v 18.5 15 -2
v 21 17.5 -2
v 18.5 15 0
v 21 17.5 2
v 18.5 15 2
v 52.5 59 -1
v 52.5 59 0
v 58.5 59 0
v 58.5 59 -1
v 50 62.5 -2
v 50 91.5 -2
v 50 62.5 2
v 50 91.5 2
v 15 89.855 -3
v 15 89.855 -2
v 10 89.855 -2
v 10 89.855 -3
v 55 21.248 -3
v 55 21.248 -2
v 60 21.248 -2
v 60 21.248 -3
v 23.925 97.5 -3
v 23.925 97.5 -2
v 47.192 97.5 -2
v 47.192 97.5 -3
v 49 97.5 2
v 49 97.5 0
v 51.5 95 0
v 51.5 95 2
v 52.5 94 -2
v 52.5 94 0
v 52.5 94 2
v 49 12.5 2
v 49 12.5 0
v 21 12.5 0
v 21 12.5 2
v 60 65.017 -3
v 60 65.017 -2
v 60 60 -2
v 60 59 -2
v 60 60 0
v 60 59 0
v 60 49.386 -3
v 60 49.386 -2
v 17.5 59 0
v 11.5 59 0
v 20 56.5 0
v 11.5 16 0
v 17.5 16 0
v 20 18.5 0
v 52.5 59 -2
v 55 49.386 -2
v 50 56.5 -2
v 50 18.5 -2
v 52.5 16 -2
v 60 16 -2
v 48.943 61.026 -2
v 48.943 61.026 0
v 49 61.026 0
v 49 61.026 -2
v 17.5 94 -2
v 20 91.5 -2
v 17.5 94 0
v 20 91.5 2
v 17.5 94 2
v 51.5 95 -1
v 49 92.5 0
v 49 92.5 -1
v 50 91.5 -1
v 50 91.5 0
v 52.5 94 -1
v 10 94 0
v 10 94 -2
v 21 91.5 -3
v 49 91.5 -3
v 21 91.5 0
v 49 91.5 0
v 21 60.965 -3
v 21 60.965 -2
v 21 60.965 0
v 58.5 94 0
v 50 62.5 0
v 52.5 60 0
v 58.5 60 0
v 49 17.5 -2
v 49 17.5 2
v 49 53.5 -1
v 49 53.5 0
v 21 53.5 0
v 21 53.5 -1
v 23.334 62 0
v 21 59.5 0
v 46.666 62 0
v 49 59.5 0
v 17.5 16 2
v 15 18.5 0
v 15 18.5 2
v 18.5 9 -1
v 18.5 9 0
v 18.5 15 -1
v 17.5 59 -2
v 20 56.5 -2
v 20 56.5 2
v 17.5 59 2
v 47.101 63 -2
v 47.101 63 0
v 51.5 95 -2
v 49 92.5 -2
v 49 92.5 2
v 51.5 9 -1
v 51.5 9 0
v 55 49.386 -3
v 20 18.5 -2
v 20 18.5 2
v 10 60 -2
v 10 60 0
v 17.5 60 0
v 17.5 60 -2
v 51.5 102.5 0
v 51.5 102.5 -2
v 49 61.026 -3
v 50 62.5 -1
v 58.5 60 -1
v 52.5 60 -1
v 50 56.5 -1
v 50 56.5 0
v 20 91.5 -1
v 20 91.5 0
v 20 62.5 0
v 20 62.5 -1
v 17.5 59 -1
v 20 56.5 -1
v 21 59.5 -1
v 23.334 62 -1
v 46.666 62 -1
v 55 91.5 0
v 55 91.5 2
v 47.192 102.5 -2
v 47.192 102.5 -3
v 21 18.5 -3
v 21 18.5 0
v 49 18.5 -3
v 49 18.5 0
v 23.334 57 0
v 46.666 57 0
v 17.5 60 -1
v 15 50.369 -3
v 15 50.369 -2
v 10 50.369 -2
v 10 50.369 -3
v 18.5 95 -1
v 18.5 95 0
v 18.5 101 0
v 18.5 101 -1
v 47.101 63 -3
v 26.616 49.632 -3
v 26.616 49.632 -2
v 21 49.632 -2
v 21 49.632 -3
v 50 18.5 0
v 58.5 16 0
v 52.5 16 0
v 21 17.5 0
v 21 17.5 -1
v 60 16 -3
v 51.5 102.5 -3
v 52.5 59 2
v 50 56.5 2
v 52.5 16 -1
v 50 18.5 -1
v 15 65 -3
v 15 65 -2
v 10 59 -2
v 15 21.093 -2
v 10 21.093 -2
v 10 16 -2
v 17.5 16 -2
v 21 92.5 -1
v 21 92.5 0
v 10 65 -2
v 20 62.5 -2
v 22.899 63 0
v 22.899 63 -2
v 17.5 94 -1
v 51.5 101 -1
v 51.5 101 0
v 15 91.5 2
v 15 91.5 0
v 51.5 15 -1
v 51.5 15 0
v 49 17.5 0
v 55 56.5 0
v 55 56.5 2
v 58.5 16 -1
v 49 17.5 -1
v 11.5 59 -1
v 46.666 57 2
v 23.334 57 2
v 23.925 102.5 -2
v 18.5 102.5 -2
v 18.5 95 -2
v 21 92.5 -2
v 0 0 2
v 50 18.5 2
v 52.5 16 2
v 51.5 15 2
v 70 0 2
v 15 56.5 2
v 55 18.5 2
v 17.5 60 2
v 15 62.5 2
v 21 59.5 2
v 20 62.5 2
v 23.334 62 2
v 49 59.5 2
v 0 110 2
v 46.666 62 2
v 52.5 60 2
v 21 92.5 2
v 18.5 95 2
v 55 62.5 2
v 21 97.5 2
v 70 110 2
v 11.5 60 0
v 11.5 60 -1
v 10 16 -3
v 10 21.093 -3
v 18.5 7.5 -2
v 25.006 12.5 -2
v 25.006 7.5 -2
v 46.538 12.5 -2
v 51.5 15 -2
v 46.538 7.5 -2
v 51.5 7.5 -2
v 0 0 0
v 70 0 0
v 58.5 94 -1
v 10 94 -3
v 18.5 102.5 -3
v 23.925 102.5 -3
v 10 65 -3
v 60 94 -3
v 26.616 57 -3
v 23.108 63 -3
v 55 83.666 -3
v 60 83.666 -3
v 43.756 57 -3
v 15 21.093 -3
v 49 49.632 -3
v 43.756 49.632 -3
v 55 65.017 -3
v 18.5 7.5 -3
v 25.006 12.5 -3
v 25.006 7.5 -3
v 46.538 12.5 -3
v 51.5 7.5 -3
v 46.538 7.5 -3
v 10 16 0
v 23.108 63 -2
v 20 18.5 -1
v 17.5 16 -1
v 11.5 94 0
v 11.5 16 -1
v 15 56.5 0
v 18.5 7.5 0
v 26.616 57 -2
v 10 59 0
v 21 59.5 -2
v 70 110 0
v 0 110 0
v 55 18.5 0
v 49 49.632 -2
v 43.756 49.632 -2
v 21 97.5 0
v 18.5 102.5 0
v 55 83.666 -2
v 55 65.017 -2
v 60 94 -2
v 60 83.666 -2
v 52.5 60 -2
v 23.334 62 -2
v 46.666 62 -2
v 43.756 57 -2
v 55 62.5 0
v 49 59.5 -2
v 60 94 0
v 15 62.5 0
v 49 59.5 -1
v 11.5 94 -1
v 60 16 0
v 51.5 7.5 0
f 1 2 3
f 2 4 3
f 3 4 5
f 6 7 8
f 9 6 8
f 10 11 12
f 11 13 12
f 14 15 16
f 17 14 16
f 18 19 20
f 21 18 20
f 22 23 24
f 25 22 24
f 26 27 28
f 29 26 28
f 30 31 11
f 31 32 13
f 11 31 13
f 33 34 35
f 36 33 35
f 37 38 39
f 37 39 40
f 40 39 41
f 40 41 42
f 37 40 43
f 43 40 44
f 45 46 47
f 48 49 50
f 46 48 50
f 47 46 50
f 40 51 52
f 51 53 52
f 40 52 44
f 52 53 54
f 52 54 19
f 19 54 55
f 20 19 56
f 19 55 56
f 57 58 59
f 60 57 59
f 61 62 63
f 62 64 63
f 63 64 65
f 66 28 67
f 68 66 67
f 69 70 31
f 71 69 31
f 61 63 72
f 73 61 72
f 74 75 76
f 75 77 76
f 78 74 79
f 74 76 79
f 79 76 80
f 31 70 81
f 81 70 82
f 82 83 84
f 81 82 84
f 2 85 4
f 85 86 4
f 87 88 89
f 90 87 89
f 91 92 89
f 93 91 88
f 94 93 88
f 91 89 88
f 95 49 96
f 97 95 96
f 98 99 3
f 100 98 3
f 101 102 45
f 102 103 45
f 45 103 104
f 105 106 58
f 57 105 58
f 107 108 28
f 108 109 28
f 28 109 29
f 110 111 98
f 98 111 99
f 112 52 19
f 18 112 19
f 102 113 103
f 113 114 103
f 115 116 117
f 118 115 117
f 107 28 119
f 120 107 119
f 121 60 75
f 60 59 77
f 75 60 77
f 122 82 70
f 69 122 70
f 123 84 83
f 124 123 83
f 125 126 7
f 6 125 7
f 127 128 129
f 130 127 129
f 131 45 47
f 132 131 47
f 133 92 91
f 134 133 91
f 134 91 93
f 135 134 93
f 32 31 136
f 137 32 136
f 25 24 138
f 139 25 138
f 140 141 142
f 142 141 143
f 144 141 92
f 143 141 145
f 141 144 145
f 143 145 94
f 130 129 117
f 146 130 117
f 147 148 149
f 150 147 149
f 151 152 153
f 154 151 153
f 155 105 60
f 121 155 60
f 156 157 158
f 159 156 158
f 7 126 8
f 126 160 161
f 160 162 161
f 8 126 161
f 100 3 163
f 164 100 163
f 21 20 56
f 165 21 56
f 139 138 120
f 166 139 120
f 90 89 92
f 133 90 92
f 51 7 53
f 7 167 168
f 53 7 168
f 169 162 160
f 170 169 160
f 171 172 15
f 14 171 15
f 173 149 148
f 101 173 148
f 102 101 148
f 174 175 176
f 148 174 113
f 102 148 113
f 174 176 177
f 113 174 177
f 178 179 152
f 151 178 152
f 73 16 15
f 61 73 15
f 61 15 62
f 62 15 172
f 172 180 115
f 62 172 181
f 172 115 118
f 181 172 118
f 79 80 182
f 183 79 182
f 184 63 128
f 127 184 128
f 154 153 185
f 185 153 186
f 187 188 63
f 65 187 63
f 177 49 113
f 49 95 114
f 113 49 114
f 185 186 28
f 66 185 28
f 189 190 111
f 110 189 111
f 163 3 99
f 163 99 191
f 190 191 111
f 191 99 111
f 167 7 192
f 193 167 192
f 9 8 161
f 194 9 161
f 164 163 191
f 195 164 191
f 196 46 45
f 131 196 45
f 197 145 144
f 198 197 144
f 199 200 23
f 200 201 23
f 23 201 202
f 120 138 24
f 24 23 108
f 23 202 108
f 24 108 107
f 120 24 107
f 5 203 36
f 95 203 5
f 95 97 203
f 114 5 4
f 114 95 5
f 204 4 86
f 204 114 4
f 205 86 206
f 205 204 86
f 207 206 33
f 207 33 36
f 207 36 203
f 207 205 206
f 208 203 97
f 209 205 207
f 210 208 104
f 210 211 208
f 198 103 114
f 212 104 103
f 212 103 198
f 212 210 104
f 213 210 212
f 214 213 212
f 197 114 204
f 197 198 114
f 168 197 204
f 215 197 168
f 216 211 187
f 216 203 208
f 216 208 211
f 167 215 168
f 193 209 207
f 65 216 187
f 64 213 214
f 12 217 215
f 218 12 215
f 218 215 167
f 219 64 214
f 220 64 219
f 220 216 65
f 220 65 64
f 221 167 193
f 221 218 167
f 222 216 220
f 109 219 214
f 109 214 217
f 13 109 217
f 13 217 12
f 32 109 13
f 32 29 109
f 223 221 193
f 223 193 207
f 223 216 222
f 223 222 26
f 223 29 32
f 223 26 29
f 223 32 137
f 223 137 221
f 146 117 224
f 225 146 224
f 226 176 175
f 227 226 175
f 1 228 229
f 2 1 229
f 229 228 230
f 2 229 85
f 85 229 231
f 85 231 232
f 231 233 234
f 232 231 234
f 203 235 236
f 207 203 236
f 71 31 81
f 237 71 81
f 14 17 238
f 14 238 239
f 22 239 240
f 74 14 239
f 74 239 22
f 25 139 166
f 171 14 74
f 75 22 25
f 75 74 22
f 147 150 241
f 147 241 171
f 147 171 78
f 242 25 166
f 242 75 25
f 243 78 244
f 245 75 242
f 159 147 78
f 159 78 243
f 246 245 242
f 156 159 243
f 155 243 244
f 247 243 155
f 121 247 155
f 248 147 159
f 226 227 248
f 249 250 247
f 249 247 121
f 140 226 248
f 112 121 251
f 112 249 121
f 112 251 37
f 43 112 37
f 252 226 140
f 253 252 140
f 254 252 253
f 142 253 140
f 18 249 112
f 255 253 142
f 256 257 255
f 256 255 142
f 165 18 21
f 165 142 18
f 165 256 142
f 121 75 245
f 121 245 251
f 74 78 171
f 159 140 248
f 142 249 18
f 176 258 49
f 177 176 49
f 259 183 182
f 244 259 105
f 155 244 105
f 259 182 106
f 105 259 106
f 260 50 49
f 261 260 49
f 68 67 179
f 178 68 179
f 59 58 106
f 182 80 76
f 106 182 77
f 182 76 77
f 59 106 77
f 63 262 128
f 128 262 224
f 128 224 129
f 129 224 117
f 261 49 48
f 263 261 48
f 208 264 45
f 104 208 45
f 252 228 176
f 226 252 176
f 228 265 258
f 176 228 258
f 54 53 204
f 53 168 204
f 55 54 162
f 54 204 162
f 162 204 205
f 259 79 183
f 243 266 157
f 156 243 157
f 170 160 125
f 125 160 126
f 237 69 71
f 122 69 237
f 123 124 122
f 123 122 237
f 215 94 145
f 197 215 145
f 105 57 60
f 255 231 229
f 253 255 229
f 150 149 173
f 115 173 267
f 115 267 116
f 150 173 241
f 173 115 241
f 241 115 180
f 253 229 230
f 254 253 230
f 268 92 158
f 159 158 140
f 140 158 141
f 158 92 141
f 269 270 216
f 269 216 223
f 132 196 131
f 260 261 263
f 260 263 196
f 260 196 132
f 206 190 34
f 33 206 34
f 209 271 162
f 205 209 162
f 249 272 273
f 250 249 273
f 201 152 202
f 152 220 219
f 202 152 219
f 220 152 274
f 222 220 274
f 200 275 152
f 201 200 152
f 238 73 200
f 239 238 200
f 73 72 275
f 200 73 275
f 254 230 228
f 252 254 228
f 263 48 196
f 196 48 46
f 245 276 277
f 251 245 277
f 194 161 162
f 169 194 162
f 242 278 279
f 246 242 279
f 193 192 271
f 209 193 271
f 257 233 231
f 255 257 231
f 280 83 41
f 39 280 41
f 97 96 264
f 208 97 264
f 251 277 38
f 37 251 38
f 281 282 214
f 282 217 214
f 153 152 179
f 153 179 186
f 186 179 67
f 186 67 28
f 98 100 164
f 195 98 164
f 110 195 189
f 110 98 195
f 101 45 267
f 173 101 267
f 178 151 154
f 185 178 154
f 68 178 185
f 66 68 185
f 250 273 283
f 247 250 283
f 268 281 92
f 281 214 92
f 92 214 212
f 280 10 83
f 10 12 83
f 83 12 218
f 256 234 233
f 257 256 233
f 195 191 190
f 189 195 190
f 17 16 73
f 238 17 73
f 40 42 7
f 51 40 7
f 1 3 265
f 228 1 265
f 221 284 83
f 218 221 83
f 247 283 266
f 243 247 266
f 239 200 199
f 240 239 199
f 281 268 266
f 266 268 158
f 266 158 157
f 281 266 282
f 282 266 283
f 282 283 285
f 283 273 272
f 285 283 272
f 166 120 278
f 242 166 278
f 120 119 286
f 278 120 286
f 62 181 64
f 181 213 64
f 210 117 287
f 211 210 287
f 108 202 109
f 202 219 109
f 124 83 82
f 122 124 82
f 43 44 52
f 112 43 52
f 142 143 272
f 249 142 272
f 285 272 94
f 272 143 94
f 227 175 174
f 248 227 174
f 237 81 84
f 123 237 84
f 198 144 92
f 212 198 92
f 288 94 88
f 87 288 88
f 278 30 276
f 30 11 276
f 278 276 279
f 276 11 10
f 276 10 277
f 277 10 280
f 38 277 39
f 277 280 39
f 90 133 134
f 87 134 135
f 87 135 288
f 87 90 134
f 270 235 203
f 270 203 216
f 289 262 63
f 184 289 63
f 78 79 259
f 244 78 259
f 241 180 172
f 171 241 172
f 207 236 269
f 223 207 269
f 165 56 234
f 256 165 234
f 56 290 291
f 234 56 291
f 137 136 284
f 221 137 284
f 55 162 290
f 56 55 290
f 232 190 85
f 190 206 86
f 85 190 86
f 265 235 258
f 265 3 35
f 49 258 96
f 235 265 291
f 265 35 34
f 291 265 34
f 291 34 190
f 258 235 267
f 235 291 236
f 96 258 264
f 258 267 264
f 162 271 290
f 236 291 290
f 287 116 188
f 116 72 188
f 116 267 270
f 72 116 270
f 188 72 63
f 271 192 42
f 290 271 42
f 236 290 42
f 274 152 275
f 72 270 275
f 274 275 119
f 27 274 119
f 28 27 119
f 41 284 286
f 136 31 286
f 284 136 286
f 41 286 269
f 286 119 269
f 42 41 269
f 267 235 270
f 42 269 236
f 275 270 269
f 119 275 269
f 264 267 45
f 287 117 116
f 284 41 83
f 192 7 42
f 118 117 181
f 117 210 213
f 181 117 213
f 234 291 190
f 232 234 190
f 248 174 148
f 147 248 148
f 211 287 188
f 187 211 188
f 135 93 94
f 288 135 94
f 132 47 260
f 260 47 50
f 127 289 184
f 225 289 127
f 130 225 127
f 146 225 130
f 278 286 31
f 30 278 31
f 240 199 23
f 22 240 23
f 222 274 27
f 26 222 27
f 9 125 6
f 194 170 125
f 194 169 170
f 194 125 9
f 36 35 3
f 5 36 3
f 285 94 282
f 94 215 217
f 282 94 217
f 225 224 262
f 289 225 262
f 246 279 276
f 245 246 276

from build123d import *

# Parameters (mm, degrees)
F0_W     = 70
F0_H     = 110
F1_DEPTH = 2
F3_DEPTH = 2
F5_DEPTH = 1
F7_DEPTH = 1


# Not quite as in the source:
# - a feature names something its author has since deleted; it is built from what else it names


with BuildPart() as f1:
    # F0 (on Top) → F1 (new body)
    with BuildSketch(Plane.XY):
        with Locations((35, 55)):
            Rectangle(F0_W, F0_H)
        Polygon((20, 18.5), (17.5, 16), (15, 18.5), (15, 56.5), (17.5, 59), (20, 56.5), align=None, mode=Mode.SUBTRACT)
        Polygon((18.5, 15), (21, 17.5), (49, 17.5), (51.5, 15), (49, 12.5), (21, 12.5), align=None, mode=Mode.SUBTRACT)
        Polygon((50, 18.5), (50, 56.5), (52.5, 59), (55, 56.5), (55, 18.5), (52.5, 16), align=None, mode=Mode.SUBTRACT)
        Polygon((15, 91.5), (17.5, 94), (20, 91.5), (20, 62.5), (17.5, 60), (15, 62.5), align=None, mode=Mode.SUBTRACT)
        Polygon((23.3336448214, 57), (21, 59.5), (23.3336448214, 62), (46.6663551786, 62), (49, 59.5), (46.6663551786, 57), align=None, mode=Mode.SUBTRACT)
        Polygon((50, 91.5), (52.5, 94), (55, 91.5), (55, 62.5), (52.5, 60), (50, 62.5), align=None, mode=Mode.SUBTRACT)
        Polygon((21, 92.5), (18.5, 95), (21, 97.5), (49, 97.5), (51.5, 95), (49, 92.5), align=None, mode=Mode.SUBTRACT)
    extrude(amount=F1_DEPTH)

    # F2 (on face) → F3 (join)
    with BuildSketch(Plane(origin=(0, 0, 0), x_dir=(1, 0, 0), z_dir=(0, 0, -1))):
        Polygon((51.5, -15), (49, -17.5), (21, -17.5), (18.5, -15), (18.5, -7.5), (10, -16), (17.5, -16), (20, -18.5), (20, -56.5), (17.5, -59), (10, -59), (10, -60), (17.5, -60), (20, -62.5), (20, -91.5), (17.5, -94), (10, -94), (18.5, -102.5), (18.5, -95), (21, -92.5), (49, -92.5), (51.5, -95), (51.5, -102.5), (60, -94), (52.5, -94), (50, -91.5), (50, -62.5), (52.5, -60), (60, -60), (60, -59), (52.5, -59), (50, -56.5), (50, -18.5), (52.5, -16), (60, -16), (51.5, -7.5), align=None)
        Polygon((49, -61.0261154606), (49, -91.5), (21, -91.5), (21, -60.9654872063), (22.8991320981, -63), (47.1008679019, -63), (48.9434060753, -61.0261154606), align=None, mode=Mode.SUBTRACT)
        Polygon((21, -18.5), (49, -18.5), (49, -51.9142135624), (49, -59.5), (46.6663551786, -62), (23.3336448214, -62), (21, -59.5), (21, -51.9142135624), align=None, mode=Mode.SUBTRACT)
    extrude(amount=F3_DEPTH)

    # F4 (on face) → F5 (join)
    with BuildSketch(Plane(origin=(0, 0, -2), x_dir=(1, 0, 0), z_dir=(0, 0, -1))):
        Polygon((23.9248658717, -102.5), (23.9248658717, -97.5), (47.1921387315, -97.5), (47.1921387315, -102.5), (51.5, -102.5), (60, -94), (60, -83.6655944586), (55, -83.6655944586), (55, -65.0172777596), (60, -65.0172777596), (60, -49.3863895535), (55, -49.3863895535), (55, -21.2481319904), (60, -21.2481319904), (60, -16), (51.5, -7.5), (46.5375445783, -7.5), (46.5375445783, -12.5), (25.0055992454, -12.5), (25.0055992454, -7.5), (18.5, -7.5), (10, -16), (10, -21.093017593), (15, -21.093017593), (15, -50.3691881895), (10, -50.3691881895), (10, -65.0000932597), (15, -65.0000932597), (15, -89.8551392555), (10, -89.8551392555), (10, -94), (18.5, -102.5), align=None)
        Polygon((49, -91.5), (44.0906696022, -91.5), (21, -91.5), (21, -68.9583107835), (21, -60.9654872063), (23.1079336207, -63), (47.1008679019, -63), (49, -61.0261154606), align=None, mode=Mode.SUBTRACT)
        Polygon((21, -49.632139504), (21, -18.5), (49, -18.5), (49, -49.632139504), (43.7561757863, -49.632139504), (43.7561757863, -57), (26.6159512103, -57), (26.6159512103, -49.632139504), align=None, mode=Mode.SUBTRACT)
    extrude(amount=F5_DEPTH)


with BuildPart() as f7:
    # F6 (on face) → F7 (new body)
    with BuildSketch(Plane(origin=(0, 0, 0), x_dir=(1, 0, 0), z_dir=(0, 0, -1))):
        Polygon((49, -92.5), (21, -92.5), (18.5, -95), (18.5, -101), (51.5, -101), (51.5, -95), align=None)
    extrude(amount=F7_DEPTH)


with BuildPart() as f7b:
    # F6 (on face) → F7, piece 2 (new body)
    with BuildSketch(Plane(origin=(0, 0, 0), x_dir=(1, 0, 0), z_dir=(0, 0, -1))):
        Polygon((11.5, -94), (17.5, -94), (20, -91.5), (20, -62.5), (17.5, -60), (11.5, -60), align=None)
    extrude(amount=F7_DEPTH)


with BuildPart() as f7c:
    # F6 (on face) → F7, piece 3 (new body)
    with BuildSketch(Plane(origin=(0, 0, 0), x_dir=(1, 0, 0), z_dir=(0, 0, -1))):
        Polygon((50, -91.5), (52.5, -94), (58.5, -94), (58.5, -60), (52.5, -60), (50, -62.5), align=None)
    extrude(amount=F7_DEPTH)


with BuildPart() as f7d:
    # F6 (on face) → F7, piece 4 (new body)
    with BuildSketch(Plane(origin=(0, 0, 0), x_dir=(1, 0, 0), z_dir=(0, 0, -1))):
        Polygon((21, -53.5), (21, -59.5), (23.3336448214, -62), (46.6663551786, -62), (49, -59.5), (49, -53.5), align=None)
    extrude(amount=F7_DEPTH)


with BuildPart() as f7e:
    # F6 (on face) → F7, piece 5 (new body)
    with BuildSketch(Plane(origin=(0, 0, 0), x_dir=(1, 0, 0), z_dir=(0, 0, -1))):
        Polygon((17.5, -59), (20, -56.5), (20, -18.5), (17.5, -16), (11.5, -16), (11.5, -59), align=None)
    extrude(amount=F7_DEPTH)


with BuildPart() as f7f:
    # F6 (on face) → F7, piece 6 (new body)
    with BuildSketch(Plane(origin=(0, 0, 0), x_dir=(1, 0, 0), z_dir=(0, 0, -1))):
        Polygon((50, -18.5), (50, -56.5), (52.5, -59), (58.5, -59), (58.5, -16), (52.5, -16), align=None)
    extrude(amount=F7_DEPTH)


with BuildPart() as f7g:
    # F6 (on face) → F7, piece 7 (new body)
    with BuildSketch(Plane(origin=(0, 0, 0), x_dir=(1, 0, 0), z_dir=(0, 0, -1))):
        Polygon((18.5, -9), (18.5, -15), (21, -17.5), (49, -17.5), (51.5, -15), (51.5, -9), align=None)
    extrude(amount=F7_DEPTH)


solid = Compound([f1.part, f7.part, f7b.part, f7c.part, f7d.part, f7e.part, f7f.part, f7g.part])
